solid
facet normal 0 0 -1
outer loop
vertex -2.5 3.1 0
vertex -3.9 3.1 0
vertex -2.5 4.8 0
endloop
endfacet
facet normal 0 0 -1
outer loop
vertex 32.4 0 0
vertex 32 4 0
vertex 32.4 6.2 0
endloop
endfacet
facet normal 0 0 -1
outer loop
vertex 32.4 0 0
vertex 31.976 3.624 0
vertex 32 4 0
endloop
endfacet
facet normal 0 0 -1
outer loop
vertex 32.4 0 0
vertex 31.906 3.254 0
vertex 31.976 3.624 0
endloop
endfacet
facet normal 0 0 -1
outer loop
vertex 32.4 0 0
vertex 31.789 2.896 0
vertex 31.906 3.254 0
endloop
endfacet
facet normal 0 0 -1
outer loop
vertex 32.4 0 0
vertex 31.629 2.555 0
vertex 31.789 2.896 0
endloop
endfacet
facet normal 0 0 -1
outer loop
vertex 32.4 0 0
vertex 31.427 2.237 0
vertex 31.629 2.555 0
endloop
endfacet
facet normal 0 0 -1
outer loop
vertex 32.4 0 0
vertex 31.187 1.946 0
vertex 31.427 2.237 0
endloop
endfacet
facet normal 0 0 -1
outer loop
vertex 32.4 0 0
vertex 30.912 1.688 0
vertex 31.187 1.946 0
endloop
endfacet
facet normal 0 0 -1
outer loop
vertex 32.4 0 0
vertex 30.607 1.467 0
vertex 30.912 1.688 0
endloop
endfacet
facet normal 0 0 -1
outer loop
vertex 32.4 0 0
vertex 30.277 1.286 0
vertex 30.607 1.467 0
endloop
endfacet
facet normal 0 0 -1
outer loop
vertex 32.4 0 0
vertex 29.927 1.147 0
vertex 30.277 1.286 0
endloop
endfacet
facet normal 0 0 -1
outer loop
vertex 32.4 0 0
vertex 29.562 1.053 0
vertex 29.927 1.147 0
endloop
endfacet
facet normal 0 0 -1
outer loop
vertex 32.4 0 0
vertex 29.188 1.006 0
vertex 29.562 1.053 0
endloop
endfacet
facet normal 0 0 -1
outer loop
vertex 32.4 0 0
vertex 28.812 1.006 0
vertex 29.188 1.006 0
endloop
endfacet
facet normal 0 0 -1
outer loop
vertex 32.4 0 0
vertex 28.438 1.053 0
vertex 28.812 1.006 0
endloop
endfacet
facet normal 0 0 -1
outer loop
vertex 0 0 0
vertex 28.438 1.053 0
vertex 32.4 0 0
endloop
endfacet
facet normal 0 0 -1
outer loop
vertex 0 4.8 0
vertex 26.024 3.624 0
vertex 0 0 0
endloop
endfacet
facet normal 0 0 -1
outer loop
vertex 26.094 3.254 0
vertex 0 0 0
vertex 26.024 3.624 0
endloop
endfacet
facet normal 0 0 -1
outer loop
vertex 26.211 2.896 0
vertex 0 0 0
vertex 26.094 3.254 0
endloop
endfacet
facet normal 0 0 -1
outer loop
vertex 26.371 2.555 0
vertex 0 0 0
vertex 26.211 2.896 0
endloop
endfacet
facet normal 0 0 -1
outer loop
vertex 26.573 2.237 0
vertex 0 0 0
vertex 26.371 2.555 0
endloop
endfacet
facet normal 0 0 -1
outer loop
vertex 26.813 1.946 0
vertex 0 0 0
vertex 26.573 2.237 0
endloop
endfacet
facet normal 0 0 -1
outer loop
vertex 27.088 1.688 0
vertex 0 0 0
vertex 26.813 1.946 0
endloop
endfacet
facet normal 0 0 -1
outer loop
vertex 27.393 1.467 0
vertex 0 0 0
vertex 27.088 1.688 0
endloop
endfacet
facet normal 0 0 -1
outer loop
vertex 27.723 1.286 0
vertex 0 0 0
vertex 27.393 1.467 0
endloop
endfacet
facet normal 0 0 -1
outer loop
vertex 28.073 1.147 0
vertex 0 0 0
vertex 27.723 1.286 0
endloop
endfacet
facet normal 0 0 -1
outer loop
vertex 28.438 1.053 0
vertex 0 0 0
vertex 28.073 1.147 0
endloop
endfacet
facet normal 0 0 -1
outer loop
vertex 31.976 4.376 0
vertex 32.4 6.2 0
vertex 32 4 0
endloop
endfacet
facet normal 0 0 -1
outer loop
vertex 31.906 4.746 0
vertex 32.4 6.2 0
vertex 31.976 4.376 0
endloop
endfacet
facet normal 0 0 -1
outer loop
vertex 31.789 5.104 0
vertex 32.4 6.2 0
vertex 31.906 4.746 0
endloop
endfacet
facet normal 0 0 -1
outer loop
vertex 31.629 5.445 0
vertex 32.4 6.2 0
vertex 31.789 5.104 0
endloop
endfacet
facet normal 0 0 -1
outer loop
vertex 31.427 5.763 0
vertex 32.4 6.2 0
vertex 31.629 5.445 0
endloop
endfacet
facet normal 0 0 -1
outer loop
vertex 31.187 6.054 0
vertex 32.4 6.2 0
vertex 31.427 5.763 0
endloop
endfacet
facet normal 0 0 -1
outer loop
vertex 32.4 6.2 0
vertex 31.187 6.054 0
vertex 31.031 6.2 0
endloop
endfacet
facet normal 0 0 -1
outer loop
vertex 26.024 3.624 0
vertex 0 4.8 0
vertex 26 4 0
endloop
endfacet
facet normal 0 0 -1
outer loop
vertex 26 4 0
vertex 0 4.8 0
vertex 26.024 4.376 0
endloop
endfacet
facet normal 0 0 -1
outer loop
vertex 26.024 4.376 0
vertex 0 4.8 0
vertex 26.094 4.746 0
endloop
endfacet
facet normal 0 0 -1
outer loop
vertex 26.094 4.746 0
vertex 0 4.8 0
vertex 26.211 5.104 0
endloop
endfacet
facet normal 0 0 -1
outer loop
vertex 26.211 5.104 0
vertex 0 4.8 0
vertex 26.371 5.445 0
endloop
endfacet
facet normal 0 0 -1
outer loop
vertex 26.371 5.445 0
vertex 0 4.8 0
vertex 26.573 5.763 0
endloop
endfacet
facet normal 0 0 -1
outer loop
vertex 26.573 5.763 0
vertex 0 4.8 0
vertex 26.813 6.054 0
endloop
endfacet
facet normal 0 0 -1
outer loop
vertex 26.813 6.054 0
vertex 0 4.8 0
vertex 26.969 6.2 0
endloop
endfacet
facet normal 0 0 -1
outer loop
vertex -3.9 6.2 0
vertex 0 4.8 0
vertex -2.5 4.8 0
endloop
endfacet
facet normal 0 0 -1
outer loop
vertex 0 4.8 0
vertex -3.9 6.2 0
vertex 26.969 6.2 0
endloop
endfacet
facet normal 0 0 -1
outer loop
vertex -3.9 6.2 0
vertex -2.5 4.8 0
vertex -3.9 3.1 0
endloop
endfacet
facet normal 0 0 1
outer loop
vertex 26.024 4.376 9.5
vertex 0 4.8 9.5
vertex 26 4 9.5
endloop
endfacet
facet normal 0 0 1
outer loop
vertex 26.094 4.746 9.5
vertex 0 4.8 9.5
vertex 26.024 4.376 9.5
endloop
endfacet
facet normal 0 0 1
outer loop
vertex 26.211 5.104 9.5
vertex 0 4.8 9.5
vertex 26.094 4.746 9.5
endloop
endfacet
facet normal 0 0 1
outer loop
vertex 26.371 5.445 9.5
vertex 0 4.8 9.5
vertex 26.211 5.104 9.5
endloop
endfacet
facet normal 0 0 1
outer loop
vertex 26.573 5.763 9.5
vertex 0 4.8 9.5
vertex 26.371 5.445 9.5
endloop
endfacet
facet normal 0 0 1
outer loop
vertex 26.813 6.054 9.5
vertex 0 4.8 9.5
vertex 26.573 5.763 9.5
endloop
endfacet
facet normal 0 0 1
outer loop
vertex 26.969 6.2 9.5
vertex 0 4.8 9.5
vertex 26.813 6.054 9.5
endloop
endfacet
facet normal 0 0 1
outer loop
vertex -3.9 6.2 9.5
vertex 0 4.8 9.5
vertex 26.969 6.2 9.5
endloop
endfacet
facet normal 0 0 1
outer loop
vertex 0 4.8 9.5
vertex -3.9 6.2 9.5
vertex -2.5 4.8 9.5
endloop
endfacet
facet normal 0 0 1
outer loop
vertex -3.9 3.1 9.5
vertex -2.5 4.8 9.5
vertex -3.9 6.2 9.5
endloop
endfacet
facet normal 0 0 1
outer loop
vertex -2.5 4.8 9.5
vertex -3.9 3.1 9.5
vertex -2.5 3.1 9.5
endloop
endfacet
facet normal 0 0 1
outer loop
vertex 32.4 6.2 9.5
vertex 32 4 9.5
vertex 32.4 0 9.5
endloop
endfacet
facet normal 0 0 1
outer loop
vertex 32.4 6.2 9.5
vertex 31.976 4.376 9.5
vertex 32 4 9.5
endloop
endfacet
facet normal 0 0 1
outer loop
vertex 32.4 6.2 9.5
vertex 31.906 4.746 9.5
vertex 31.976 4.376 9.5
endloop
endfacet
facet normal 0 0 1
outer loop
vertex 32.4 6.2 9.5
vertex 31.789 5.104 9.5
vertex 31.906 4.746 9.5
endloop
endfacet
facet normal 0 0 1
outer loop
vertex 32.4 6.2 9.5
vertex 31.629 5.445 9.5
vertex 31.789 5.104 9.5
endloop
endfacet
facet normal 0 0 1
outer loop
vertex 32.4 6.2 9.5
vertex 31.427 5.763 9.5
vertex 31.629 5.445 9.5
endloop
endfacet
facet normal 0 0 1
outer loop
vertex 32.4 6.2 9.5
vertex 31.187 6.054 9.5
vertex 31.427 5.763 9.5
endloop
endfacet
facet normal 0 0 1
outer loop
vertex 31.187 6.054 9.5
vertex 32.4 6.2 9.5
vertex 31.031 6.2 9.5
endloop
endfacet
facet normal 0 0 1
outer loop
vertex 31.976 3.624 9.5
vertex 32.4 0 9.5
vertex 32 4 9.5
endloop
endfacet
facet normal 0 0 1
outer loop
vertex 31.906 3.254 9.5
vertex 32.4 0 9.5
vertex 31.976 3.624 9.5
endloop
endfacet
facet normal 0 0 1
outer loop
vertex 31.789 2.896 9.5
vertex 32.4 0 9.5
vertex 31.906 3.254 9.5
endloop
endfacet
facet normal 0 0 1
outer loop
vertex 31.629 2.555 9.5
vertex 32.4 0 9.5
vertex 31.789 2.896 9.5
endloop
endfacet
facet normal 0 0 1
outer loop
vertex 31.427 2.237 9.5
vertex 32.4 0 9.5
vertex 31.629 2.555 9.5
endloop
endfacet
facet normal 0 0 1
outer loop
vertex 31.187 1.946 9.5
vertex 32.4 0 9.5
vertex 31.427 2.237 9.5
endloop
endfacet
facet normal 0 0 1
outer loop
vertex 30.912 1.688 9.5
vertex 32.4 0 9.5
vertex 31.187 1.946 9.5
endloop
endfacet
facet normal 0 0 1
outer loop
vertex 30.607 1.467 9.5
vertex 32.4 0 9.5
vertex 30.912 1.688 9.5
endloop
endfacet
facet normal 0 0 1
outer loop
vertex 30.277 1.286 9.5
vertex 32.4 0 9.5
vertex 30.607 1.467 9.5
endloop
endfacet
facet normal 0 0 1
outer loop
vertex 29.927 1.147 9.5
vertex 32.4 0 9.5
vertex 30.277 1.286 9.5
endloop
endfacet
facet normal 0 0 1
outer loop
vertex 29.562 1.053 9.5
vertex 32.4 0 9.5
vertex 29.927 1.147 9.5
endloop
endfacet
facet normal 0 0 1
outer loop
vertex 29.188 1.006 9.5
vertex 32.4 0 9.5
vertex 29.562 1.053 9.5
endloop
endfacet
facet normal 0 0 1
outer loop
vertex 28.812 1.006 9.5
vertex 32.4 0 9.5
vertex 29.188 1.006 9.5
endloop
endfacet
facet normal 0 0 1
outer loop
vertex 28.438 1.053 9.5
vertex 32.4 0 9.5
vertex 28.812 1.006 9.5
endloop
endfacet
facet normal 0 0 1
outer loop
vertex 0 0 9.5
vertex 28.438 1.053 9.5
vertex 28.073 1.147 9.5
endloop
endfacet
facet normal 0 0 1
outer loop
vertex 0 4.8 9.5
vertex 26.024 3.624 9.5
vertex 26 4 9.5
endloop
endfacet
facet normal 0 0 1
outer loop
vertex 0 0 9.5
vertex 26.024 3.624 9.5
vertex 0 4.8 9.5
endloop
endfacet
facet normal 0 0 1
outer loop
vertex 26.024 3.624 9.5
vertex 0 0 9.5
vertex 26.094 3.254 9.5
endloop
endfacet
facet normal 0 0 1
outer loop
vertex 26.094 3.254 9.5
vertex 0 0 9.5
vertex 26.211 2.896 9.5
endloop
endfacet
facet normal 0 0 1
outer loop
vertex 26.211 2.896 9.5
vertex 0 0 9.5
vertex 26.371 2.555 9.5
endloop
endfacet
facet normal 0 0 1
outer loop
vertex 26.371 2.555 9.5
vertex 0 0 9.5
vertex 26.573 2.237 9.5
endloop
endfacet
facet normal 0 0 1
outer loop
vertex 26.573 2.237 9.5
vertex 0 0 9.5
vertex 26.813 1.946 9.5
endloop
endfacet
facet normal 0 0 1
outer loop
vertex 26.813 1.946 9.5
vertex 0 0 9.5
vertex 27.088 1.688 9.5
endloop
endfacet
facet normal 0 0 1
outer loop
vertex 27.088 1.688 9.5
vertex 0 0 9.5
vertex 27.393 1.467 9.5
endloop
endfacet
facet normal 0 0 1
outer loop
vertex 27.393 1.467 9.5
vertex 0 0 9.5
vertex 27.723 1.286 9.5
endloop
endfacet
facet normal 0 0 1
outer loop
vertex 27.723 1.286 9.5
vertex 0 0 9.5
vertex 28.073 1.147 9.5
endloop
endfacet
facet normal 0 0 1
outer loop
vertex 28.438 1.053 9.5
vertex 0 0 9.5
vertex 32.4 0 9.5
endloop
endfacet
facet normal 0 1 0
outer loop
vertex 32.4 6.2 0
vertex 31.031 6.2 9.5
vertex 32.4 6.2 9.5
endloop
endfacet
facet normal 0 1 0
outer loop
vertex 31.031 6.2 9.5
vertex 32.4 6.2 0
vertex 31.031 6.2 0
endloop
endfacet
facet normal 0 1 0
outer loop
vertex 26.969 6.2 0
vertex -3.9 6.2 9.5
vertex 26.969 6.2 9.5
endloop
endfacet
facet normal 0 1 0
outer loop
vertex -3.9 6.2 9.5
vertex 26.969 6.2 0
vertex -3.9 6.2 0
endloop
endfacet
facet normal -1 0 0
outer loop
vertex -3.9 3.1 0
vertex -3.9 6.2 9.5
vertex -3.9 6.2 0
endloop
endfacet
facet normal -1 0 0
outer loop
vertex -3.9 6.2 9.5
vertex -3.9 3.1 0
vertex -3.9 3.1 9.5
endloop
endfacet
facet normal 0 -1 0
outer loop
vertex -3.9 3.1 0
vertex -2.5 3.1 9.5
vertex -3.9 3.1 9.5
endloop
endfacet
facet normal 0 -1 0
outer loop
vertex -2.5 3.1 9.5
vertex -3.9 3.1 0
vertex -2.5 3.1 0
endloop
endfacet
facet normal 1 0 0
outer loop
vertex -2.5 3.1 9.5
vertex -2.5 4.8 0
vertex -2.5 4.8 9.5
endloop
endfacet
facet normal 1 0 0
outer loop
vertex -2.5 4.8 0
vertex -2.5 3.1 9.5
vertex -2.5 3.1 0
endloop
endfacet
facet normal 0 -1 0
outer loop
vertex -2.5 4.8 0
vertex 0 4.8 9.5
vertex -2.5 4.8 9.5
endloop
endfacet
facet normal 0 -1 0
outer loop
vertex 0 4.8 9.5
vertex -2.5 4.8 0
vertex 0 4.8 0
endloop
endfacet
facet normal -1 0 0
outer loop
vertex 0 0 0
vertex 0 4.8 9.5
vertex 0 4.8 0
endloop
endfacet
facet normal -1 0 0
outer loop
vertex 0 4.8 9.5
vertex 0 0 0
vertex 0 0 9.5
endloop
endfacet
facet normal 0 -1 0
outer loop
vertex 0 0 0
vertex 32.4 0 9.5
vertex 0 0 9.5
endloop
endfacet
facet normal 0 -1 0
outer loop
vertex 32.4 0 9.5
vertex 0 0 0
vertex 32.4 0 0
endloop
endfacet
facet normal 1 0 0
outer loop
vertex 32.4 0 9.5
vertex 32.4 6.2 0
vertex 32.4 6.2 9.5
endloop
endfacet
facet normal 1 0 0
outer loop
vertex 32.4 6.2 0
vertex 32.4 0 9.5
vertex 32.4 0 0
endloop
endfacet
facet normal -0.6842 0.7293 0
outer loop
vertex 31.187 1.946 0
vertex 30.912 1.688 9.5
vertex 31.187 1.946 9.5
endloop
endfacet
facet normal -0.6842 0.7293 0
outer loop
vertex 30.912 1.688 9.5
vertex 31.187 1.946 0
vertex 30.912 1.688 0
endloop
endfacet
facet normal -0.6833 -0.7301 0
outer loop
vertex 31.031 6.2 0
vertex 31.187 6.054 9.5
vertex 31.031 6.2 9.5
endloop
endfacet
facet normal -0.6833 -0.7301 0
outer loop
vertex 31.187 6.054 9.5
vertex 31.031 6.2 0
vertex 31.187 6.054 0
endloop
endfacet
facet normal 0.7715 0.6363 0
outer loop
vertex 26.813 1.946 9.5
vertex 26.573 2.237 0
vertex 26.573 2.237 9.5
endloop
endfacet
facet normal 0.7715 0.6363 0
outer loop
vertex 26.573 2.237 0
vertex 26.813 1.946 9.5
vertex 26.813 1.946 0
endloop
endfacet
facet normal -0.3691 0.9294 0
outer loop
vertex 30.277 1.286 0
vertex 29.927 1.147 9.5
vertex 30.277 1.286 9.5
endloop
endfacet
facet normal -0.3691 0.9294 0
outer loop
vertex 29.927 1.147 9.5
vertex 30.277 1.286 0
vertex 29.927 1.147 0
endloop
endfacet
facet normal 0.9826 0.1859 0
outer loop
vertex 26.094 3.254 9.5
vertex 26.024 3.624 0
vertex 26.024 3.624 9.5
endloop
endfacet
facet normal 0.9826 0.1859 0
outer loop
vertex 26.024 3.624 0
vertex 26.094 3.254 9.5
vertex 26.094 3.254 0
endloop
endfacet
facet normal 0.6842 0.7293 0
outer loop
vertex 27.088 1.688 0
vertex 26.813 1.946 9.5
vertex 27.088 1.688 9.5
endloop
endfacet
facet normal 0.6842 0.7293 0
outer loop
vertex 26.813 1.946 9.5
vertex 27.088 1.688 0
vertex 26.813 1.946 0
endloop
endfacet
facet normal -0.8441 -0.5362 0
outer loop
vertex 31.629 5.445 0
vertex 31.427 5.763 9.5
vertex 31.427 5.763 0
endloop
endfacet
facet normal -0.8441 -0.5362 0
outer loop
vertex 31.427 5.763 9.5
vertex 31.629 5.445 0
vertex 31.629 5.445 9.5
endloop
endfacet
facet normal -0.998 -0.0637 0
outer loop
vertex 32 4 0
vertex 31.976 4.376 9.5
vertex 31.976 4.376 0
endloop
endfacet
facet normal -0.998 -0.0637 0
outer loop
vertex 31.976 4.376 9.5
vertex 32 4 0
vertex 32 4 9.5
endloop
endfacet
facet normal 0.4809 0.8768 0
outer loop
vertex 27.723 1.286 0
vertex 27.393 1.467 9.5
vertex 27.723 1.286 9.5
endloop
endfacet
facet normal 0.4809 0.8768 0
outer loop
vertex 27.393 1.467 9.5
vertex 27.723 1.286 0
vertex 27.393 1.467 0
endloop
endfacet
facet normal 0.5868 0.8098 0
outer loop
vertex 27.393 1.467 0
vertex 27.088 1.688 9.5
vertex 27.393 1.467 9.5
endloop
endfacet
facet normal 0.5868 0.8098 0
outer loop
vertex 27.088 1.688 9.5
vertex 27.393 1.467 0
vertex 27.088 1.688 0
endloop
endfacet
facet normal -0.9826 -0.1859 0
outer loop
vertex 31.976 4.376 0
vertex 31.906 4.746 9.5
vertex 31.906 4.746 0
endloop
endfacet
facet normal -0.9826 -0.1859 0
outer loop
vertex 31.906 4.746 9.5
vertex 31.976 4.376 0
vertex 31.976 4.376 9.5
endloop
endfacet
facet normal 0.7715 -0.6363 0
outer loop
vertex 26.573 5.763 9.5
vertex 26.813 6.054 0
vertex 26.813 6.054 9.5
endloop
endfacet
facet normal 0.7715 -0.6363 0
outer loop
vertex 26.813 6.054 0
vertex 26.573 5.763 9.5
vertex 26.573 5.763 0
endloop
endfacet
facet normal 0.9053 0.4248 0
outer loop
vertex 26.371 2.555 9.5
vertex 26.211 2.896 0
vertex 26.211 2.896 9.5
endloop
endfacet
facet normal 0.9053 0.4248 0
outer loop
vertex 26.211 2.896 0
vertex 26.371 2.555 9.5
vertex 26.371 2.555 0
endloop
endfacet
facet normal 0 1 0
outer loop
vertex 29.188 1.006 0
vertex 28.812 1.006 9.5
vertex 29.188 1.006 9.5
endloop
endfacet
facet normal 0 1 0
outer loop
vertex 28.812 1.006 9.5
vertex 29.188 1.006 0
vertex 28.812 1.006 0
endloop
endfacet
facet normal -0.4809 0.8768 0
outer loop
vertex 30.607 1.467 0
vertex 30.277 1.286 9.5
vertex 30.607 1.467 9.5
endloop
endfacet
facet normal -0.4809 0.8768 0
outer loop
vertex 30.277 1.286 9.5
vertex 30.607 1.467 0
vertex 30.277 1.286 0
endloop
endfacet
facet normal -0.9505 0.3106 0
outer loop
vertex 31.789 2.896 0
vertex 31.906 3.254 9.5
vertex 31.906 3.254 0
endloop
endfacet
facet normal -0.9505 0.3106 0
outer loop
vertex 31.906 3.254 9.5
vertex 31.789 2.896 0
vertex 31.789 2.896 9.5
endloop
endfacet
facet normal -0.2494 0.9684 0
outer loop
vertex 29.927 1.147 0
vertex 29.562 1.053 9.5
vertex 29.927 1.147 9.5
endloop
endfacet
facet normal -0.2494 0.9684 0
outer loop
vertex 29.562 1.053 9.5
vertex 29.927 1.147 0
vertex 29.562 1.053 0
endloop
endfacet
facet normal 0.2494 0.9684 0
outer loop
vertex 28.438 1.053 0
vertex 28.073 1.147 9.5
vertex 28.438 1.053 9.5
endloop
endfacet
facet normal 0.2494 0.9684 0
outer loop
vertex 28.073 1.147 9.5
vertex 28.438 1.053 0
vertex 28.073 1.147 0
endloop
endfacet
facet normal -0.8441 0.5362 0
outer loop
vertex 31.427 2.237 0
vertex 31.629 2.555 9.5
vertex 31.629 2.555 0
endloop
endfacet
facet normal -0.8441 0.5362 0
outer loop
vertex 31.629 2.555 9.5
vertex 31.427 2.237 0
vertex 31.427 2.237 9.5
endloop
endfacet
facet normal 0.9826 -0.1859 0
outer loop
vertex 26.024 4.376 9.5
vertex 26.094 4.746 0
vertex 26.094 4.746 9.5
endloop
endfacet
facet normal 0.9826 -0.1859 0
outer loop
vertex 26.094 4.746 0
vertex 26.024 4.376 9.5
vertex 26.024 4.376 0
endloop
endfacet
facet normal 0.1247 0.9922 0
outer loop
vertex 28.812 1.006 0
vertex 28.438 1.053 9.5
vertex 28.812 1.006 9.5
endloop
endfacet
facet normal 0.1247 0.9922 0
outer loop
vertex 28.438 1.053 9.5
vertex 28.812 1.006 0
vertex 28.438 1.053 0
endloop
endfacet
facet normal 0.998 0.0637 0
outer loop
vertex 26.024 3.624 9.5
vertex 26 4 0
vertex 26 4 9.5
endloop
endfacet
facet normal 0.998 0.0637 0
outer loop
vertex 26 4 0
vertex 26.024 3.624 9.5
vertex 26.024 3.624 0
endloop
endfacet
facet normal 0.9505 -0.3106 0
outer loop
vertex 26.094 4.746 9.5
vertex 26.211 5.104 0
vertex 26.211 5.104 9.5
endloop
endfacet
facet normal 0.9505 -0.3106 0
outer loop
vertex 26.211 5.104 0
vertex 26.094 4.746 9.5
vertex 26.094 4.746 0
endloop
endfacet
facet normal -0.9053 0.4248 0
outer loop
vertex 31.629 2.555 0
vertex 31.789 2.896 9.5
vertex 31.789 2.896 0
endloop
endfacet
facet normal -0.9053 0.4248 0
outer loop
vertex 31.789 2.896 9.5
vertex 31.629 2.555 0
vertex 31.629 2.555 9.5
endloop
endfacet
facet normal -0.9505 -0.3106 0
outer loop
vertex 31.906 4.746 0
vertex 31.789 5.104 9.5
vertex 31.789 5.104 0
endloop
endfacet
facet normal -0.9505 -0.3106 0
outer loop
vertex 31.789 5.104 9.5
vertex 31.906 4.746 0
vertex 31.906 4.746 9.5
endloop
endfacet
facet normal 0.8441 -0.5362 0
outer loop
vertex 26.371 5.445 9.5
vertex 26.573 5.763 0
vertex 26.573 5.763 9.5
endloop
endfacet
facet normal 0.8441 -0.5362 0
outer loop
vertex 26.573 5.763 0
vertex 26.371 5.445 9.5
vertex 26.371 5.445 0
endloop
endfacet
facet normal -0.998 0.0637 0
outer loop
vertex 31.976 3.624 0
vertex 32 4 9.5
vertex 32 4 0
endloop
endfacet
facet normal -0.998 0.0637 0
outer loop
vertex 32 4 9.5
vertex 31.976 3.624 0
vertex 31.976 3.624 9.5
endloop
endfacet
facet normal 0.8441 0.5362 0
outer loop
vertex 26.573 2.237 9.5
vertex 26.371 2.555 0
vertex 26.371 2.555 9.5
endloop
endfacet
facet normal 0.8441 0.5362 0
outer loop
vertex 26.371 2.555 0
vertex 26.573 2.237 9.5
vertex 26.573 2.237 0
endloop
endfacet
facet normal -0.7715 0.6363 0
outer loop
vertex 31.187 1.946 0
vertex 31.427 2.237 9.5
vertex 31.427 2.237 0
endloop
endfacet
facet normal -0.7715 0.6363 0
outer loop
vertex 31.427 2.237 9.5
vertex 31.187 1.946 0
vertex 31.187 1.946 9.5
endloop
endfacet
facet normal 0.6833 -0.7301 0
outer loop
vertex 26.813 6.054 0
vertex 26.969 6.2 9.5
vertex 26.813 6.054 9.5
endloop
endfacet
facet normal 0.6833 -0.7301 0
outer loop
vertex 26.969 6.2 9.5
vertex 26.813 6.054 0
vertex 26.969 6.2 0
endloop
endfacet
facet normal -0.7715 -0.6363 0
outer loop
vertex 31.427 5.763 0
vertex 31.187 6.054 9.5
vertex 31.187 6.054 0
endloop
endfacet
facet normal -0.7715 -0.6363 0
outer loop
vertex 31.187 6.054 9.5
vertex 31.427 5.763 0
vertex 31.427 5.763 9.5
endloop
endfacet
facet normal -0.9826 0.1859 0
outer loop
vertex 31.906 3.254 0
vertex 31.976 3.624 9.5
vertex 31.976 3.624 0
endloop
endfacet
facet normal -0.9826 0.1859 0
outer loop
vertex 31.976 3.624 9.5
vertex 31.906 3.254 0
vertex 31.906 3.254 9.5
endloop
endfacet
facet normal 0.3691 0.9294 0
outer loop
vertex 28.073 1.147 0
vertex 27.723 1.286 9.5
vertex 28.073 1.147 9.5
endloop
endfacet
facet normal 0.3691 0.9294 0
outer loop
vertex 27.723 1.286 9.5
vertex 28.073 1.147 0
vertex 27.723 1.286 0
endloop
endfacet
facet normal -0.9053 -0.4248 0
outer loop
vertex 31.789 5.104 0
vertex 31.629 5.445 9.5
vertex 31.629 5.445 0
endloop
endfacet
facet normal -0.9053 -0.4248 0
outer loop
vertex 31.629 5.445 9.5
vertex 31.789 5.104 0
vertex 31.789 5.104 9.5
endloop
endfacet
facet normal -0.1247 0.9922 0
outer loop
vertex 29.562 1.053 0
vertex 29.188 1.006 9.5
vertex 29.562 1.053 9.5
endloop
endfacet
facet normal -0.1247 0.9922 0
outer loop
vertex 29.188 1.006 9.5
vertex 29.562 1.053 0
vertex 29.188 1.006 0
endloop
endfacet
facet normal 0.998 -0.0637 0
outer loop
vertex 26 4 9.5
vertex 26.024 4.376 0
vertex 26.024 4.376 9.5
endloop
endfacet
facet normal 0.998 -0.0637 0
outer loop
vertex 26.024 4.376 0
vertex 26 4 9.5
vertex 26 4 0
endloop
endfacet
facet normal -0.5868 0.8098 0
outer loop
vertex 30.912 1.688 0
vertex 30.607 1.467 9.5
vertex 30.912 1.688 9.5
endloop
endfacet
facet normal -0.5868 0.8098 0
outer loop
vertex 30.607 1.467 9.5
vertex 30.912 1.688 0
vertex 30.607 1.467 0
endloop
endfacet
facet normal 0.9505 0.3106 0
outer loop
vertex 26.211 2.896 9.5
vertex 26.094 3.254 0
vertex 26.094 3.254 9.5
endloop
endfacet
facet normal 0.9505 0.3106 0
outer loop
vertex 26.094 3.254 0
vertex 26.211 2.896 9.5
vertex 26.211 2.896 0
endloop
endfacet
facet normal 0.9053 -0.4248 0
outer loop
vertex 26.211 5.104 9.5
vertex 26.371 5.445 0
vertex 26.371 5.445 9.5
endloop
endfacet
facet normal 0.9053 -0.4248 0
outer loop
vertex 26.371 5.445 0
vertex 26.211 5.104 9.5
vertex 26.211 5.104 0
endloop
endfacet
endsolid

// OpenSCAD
/*
Title: Candy dishwasher - Door handle front plate
*/
$fn=20;

text = "Center";
font = "Liberation Sans";

module body(){
    polygon(points=[[0,0],[32.4,0],
    [32.4,6.2],[-3.9,6.2],[-3.9,3.1],[-2.5, 3.1],[-2.5, 4.8],[0, 4.8]
     ]);
}

module hole(){
    translate([29,4,-1]) 
    cylinder(r=3,h=12,$fn=50);
}

module logo(text){
    text(text,font = font, size = 5); 
}
  

union() {
    difference(){
        linear_extrude (height=9.5)
        body();
        hole();
    };
    /*translate([7,6.2,7])
        rotate([-90])
        linear_extrude (height=1)
       // logo("©JMT");*/
}
